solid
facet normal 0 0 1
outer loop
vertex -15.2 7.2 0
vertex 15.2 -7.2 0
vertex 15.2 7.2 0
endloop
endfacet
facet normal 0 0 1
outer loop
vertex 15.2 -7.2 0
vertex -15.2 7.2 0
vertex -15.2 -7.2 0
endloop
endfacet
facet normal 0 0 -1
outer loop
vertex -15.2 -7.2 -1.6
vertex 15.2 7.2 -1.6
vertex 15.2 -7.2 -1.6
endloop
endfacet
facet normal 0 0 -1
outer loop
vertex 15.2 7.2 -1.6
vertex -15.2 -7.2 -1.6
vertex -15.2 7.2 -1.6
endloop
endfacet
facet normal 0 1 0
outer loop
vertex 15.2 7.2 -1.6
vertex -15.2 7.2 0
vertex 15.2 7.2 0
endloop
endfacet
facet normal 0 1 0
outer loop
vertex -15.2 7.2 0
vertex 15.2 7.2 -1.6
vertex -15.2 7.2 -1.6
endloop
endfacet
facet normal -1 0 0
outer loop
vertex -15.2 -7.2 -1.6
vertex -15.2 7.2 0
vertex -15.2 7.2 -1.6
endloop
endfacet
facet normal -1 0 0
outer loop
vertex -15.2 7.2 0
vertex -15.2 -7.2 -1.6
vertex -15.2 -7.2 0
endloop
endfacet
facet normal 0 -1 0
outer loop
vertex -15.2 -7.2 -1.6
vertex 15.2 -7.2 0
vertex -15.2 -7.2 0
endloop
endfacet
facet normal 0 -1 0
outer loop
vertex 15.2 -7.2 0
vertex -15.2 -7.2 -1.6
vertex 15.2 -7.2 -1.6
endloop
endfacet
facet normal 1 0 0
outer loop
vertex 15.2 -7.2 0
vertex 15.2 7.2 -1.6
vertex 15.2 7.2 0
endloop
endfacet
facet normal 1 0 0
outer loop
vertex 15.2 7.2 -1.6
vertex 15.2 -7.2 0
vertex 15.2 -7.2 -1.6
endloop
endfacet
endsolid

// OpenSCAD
// file: ../p/box.scad
use <../lib.scad>
function ldraw_lib__box() = [
// 0 Box 6 (six faces)
// 0 Name: box.dat
// 0 Author: James Jessiman
// 0 !LDRAW_ORG Primitive UPDATE 2002-05
// 0 !LICENSE Licensed under CC BY 4.0 : see CAreadme.txt
// 
// 0 BFC CERTIFY CCW
  [0,"BFC","CERTIFY"],
  [0,"BFC","CCW"],
// 
// 0 !HISTORY 2002-08-22 [sbliss] Applied BFC
// 0 !HISTORY 2002-11-30 [PTadmin] Official Update 2002-05
// 0 !HISTORY 2007-06-24 [PTadmin] Header formatted for Contributor Agreement
// 0 !HISTORY 2008-07-01 [PTadmin] Official Update 2008-01
// 
// 
// 2 24 1 1 1 -1 1 1
  [2,24,1,1,1,-1,1,1],
// 2 24 -1 1 1 -1 1 -1
  [2,24,-1,1,1,-1,1,-1],
// 2 24 -1 1 -1 1 1 -1
  [2,24,-1,1,-1,1,1,-1],
// 2 24 1 1 -1 1 1 1
  [2,24,1,1,-1,1,1,1],
// 2 24 1 -1 1 -1 -1 1
  [2,24,1,-1,1,-1,-1,1],
// 2 24 -1 -1 1 -1 -1 -1
  [2,24,-1,-1,1,-1,-1,-1],
// 2 24 -1 -1 -1 1 -1 -1
  [2,24,-1,-1,-1,1,-1,-1],
// 2 24 1 -1 -1 1 -1 1
  [2,24,1,-1,-1,1,-1,1],
// 2 24 1 -1 1 1 1 1
  [2,24,1,-1,1,1,1,1],
// 2 24 -1 -1 1 -1 1 1
  [2,24,-1,-1,1,-1,1,1],
// 2 24 1 -1 -1 1 1 -1
  [2,24,1,-1,-1,1,1,-1],
// 2 24 -1 -1 -1 -1 1 -1
  [2,24,-1,-1,-1,-1,1,-1],
// 4 16 1 1 1 1 1 -1 -1 1 -1 -1 1 1
  [4,16,1,1,1,1,1,-1,-1,1,-1,-1,1,1],
// 4 16 -1 -1 -1 1 -1 -1 1 -1 1 -1 -1 1
  [4,16,-1,-1,-1,1,-1,-1,1,-1,1,-1,-1,1],
// 4 16 -1 -1 1 1 -1 1 1 1 1 -1 1 1
  [4,16,-1,-1,1,1,-1,1,1,1,1,-1,1,1],
// 4 16 -1 -1 -1 -1 -1 1 -1 1 1 -1 1 -1
  [4,16,-1,-1,-1,-1,-1,1,-1,1,1,-1,1,-1],
// 4 16 1 -1 -1 -1 -1 -1 -1 1 -1 1 1 -1
  [4,16,1,-1,-1,-1,-1,-1,-1,1,-1,1,1,-1],
// 4 16 1 -1 1 1 -1 -1 1 1 -1 1 1 1
  [4,16,1,-1,1,1,-1,-1,1,1,-1,1,1,1],
// 0
];
module ldraw_lib__box(step=0, col=false, unit=2/5, alt=false, line=0.2, solid=!$preview)
    makepoly(ldraw_lib__box(), step=step, col=col, unit=unit, alt=alt, line=line, solid=solid);
ldraw_lib__box(line=0.2);
// main file
use <../lib.scad>
use <../p/box.scad>
function ldraw_lib__430() = [
// 0 ~Train Brick  2 x  4 Holder Bottom Solid
// 0 Name: 430.dat
// 0 Author: Niels Karsdorp [nielsk]
// 0 !LDRAW_ORG Part UPDATE 2025-09
// 0 !LICENSE Licensed under CC BY 4.0 : see CAreadme.txt
// 
// 0 BFC CERTIFY CCW
  [0,"BFC","CERTIFY"],
  [0,"BFC","CCW"],
// 
// 0 !CMDLINE -c0
// 
// 0 !HISTORY 2011-07-25 [PTadmin] Official Update 2011-01
// 0 !HISTORY 2025-09-27 [OrionP] Changed winding to CCW
// 0 !HISTORY 2025-09-29 [OrionP] Official Update 2025-09
// 
// 1 16 0 2 0 38 0 0 0 -2 0 0 0 18 box.dat
  [1,16,0,2,0,38,0,0,0,-2,0,0,0,18, ldraw_lib__box()],
// 0 //
];
module ldraw_lib__430(step=0, col=false, unit=2/5, alt=false, line=0.2, solid=!$preview)
    makepoly(ldraw_lib__430(), step=step, col=col, unit=unit, alt=alt, line=line, solid=solid);
ldraw_lib__430(line=0.2);
